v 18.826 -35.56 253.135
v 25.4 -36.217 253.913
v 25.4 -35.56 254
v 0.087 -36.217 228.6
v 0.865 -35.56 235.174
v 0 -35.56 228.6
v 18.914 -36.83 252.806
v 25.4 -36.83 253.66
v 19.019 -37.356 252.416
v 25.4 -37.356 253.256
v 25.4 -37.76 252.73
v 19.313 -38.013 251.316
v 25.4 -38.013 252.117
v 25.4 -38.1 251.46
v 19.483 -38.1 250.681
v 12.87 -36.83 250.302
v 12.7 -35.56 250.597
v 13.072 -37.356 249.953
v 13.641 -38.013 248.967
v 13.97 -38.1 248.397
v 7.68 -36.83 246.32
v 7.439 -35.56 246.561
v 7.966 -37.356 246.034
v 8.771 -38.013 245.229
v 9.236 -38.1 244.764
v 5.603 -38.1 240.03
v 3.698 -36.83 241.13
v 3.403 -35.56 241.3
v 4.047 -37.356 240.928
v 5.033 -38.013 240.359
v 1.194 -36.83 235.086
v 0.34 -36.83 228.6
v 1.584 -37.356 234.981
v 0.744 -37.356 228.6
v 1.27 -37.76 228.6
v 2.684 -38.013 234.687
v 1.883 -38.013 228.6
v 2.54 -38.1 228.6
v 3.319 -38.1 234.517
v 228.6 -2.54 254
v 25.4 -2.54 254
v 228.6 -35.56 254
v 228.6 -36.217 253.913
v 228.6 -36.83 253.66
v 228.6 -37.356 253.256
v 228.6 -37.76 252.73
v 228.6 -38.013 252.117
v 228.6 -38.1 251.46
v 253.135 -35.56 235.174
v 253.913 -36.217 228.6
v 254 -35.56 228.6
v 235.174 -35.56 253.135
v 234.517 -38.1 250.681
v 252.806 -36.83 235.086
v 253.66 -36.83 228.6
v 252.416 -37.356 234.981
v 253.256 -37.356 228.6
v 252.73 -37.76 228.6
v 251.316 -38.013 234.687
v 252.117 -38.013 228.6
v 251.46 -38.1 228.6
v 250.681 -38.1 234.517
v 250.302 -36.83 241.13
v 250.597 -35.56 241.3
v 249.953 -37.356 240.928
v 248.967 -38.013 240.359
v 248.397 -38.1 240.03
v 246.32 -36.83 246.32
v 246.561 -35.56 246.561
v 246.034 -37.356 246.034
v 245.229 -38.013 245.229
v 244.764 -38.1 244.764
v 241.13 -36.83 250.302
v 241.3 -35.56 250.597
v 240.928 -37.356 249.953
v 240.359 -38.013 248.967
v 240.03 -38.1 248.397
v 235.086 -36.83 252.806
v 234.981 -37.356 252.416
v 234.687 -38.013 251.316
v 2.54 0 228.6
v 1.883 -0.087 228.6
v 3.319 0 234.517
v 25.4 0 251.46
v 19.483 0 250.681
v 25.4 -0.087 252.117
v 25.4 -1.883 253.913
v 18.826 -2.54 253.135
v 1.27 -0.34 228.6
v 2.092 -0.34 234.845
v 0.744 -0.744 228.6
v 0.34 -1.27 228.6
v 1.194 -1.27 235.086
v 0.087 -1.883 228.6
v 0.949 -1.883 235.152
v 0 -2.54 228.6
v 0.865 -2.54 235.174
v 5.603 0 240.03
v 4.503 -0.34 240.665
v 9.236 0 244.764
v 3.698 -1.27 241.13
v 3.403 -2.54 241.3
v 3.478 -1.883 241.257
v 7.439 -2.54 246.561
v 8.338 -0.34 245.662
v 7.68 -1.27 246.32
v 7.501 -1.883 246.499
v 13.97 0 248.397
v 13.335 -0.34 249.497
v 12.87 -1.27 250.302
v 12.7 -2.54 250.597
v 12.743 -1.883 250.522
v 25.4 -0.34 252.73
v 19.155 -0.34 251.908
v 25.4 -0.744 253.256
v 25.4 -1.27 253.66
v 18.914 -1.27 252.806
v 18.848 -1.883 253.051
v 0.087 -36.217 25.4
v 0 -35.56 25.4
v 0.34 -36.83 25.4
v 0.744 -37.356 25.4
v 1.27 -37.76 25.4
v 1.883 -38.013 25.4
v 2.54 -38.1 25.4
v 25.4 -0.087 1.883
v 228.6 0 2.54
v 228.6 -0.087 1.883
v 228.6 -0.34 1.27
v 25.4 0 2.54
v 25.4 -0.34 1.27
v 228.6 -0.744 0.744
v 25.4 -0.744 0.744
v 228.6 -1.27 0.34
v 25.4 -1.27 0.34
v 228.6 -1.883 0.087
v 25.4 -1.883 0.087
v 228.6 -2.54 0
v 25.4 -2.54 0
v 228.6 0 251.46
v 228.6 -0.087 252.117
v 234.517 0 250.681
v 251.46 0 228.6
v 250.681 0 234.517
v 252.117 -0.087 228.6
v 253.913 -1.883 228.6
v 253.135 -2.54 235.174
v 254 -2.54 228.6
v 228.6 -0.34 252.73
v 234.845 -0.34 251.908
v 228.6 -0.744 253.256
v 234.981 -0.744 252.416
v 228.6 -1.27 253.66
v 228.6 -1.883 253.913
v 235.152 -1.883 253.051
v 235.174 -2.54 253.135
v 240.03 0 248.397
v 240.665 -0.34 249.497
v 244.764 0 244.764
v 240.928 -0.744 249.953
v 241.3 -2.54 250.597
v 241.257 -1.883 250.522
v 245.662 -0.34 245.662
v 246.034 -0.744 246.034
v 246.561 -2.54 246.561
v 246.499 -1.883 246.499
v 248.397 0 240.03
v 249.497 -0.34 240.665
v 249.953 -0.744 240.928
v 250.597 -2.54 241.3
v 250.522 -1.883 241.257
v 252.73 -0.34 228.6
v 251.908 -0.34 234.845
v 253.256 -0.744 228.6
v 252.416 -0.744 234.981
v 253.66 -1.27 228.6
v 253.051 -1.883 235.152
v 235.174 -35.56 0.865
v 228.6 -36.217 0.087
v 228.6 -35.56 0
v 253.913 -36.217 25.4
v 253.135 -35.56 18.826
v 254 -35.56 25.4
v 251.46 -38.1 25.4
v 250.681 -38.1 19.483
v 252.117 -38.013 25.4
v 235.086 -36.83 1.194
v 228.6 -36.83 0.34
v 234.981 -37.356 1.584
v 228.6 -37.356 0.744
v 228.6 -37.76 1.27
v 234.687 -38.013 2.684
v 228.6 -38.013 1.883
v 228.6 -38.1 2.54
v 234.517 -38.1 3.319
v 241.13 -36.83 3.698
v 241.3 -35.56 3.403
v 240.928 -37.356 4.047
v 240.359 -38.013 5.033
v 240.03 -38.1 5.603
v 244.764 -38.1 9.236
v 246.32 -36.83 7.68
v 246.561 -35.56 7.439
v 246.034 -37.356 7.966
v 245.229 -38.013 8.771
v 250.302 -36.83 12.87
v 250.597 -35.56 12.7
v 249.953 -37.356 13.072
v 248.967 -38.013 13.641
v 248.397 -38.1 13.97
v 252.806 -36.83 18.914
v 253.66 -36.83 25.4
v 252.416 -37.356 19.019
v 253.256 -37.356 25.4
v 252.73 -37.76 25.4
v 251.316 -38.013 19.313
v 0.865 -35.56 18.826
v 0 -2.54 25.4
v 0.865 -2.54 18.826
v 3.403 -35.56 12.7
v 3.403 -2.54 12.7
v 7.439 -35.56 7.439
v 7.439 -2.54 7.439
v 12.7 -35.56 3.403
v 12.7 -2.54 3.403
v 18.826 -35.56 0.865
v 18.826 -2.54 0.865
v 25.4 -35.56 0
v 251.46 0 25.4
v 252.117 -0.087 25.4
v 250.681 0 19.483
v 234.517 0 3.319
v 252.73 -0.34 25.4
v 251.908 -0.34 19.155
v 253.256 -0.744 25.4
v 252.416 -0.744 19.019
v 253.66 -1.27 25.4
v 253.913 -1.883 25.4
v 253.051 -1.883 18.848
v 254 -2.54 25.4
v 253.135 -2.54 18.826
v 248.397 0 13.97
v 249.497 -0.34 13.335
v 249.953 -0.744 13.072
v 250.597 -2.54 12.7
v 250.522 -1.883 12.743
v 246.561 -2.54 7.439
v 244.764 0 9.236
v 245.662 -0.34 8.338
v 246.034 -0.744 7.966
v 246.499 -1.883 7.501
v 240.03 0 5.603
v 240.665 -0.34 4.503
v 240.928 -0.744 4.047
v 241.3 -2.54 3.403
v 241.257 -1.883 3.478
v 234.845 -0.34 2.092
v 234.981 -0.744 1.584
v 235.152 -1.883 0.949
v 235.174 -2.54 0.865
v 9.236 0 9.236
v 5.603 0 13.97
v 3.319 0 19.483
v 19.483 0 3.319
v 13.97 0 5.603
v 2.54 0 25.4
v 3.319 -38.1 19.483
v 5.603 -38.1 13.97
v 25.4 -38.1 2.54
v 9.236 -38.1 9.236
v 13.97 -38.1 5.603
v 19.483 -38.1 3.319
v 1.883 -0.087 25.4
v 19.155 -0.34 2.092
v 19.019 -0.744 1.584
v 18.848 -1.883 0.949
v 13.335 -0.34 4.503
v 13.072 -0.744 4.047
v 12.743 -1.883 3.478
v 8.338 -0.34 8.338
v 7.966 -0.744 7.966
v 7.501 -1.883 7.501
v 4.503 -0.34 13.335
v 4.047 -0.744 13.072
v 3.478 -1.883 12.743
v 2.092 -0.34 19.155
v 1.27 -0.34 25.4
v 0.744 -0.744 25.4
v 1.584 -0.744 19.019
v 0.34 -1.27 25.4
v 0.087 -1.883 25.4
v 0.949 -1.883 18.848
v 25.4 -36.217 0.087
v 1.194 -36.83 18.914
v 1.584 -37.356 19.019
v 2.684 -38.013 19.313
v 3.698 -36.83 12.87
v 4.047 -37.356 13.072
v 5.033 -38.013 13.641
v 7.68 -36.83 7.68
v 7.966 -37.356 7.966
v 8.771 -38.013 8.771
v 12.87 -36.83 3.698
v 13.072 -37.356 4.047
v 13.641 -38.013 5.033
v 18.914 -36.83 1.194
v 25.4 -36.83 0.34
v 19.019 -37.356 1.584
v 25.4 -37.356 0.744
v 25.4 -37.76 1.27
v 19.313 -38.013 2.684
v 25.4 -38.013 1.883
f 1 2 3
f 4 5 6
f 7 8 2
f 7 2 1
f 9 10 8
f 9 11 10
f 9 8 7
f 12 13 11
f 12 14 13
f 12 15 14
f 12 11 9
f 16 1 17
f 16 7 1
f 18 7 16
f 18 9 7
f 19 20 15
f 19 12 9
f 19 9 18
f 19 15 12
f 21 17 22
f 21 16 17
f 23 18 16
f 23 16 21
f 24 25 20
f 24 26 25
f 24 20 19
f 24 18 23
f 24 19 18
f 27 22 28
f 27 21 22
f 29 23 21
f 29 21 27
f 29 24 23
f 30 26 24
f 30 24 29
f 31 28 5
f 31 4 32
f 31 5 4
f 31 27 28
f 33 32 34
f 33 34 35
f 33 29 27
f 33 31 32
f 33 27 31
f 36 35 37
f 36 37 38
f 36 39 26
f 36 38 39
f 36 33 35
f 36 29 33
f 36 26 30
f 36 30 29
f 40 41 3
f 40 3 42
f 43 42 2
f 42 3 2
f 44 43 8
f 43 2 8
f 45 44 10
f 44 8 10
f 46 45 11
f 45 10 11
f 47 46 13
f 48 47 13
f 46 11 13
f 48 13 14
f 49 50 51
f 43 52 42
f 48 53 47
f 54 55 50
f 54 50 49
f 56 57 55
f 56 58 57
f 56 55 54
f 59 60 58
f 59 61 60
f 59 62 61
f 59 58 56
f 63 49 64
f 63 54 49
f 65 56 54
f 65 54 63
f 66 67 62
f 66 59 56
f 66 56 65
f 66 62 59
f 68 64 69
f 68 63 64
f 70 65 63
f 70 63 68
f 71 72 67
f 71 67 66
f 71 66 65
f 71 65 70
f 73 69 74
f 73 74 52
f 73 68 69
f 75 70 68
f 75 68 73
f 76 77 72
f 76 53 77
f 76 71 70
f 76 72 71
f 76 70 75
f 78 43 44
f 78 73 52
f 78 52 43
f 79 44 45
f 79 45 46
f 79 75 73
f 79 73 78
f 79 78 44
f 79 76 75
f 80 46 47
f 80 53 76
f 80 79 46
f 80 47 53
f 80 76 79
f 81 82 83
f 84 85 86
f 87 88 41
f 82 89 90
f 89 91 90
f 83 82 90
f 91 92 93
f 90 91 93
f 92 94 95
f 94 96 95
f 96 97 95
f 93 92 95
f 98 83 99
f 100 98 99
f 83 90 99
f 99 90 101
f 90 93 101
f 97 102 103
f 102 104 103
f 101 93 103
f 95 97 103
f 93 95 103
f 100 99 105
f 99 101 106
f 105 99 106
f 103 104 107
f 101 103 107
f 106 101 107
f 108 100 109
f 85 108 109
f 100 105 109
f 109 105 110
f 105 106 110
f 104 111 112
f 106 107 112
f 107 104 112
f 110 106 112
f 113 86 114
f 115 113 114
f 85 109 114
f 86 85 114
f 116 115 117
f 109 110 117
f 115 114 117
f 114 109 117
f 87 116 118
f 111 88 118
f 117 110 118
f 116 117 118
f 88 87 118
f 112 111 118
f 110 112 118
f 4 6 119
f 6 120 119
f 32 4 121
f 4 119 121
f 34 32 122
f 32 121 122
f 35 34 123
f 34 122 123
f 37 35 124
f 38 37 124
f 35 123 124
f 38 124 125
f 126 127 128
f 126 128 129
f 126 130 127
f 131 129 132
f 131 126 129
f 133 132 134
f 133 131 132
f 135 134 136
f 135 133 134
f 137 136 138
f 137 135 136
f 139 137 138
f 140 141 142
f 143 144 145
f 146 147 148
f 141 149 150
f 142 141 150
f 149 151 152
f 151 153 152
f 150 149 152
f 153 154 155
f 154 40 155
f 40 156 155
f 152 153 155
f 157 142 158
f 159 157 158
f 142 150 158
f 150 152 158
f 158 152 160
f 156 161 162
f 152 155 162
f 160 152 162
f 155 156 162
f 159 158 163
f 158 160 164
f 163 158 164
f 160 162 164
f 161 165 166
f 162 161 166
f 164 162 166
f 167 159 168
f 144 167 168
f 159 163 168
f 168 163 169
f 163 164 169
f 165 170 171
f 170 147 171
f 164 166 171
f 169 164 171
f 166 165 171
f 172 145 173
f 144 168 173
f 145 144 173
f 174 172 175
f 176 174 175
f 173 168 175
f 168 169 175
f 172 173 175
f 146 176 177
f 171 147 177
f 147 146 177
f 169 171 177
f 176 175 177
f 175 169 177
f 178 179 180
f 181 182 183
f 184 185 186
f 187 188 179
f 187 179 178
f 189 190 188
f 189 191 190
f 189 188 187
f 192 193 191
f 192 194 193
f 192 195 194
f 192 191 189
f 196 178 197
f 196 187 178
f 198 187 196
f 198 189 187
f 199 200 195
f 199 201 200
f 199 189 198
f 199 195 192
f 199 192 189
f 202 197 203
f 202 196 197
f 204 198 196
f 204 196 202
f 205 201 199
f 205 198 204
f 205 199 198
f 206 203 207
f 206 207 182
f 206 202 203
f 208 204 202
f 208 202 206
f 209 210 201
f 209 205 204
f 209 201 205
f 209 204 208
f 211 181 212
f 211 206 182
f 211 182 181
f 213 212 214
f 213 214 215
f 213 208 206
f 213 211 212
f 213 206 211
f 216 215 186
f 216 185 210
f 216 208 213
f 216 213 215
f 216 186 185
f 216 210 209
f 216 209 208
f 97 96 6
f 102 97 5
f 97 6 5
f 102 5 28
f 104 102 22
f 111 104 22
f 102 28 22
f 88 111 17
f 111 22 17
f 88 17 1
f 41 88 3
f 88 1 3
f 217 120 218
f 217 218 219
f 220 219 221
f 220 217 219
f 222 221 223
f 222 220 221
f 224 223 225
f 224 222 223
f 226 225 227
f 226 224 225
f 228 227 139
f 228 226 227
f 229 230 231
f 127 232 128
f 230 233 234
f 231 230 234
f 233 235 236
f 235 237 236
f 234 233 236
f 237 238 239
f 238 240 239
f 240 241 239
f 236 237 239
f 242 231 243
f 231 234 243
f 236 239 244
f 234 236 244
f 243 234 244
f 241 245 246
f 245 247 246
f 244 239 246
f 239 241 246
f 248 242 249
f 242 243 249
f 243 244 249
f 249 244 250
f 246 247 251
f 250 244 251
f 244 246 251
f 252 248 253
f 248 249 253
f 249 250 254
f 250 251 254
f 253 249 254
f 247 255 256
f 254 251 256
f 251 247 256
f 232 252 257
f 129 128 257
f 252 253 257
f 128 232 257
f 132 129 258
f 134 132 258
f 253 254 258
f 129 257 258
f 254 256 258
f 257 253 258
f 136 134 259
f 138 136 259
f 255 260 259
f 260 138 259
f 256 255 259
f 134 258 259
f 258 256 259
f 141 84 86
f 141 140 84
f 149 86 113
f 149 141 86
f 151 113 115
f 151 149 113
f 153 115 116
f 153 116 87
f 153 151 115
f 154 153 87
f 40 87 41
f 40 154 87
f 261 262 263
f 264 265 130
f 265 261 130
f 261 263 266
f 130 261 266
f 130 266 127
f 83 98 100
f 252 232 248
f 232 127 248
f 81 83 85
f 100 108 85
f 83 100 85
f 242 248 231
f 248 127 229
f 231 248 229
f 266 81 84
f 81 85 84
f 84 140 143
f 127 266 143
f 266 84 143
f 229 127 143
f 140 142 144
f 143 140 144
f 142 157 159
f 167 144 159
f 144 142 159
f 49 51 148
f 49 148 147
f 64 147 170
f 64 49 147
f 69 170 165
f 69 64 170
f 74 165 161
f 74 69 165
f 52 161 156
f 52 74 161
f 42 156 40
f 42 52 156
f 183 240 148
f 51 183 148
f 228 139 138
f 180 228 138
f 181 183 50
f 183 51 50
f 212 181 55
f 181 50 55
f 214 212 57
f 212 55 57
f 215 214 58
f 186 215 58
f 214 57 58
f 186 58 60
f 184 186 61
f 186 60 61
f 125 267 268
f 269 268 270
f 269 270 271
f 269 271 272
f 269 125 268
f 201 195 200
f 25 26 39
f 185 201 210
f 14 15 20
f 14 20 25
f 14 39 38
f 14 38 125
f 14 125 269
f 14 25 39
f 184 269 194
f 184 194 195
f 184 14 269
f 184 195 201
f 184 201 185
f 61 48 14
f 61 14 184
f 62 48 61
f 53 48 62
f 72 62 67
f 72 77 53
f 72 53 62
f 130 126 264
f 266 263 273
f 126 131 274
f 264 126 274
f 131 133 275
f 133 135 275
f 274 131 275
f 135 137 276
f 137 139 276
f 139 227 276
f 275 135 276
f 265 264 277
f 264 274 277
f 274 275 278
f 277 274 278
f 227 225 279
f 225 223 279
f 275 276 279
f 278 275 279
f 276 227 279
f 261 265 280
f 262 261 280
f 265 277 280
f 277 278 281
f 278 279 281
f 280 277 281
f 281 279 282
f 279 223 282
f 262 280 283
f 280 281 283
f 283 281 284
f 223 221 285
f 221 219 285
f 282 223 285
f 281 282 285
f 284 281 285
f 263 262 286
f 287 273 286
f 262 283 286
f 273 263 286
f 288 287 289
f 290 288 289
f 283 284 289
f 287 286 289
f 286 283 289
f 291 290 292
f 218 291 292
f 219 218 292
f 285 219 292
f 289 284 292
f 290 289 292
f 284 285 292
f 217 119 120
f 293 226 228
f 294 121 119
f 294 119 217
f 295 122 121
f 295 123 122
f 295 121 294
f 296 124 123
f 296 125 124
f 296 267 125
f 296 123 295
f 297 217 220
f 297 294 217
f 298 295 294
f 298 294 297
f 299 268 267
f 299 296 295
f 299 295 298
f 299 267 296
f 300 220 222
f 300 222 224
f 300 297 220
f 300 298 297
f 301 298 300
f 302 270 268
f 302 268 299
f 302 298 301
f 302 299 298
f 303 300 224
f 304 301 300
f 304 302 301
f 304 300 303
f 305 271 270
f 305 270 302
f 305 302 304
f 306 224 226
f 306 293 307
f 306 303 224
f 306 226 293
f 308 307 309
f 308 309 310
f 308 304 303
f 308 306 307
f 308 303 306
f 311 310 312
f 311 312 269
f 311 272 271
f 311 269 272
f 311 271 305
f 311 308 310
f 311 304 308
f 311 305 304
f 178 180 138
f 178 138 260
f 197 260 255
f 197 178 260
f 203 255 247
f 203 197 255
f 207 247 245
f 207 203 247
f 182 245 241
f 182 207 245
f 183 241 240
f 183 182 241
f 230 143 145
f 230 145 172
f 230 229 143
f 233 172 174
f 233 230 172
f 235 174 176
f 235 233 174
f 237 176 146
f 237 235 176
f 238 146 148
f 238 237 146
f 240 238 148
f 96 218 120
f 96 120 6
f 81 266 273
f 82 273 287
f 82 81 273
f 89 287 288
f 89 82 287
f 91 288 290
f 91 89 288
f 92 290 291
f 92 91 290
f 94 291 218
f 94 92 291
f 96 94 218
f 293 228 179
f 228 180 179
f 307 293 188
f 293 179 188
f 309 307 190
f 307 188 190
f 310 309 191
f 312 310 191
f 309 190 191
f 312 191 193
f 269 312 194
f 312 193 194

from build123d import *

# Parameters (mm, degrees)
F0_W     = 254
F0_H     = 254
F1_DEPTH = 38.1
F2_R     = 25.4
F3_R     = 25.4
F4_R     = 25.4
F5_R     = 25.4
F6_R     = 2.54
F7_R     = 2.54


with BuildPart() as f1:
    # F0 (on Front) → F1 (new body)
    with BuildSketch(Plane.XZ):
        with Locations((127, 127)):
            Rectangle(F0_W, F0_H)
    extrude(amount=F1_DEPTH)

    # F2
    f2_edges = [f1.edges().sort_by_distance(p)[0] for p in [
        (0, -19.05, 254),
    ]]
    fillet(f2_edges, radius=F2_R)

    # F3
    f3_edges = [f1.edges().sort_by_distance(p)[0] for p in [
        (0, -19.05, 0),
    ]]
    fillet(f3_edges, radius=F3_R)

    # F4
    f4_edges = [f1.edges().sort_by_distance(p)[0] for p in [
        (254, -19.05, 0),
    ]]
    fillet(f4_edges, radius=F4_R)

    # F5
    f5_edges = [f1.edges().sort_by_distance(p)[0] for p in [
        (254, -19.05, 254),
    ]]
    fillet(f5_edges, radius=F5_R)

    # F6
    f6_edges = [f1.edges().sort_by_distance(p)[0] for p in [
        (127, 0, 254),
        (246.560512, 0, 246.560512),
        (254, 0, 127),
        (246.560512, 0, 7.439488),
        (127, 0, 0),
        (7.439488, 0, 7.439488),
        (0, 0, 127),
        (7.439488, 0, 246.560512),
    ]]
    fillet(f6_edges, radius=F6_R)

    # F7
    f7_edges = [f1.edges().sort_by_distance(p)[0] for p in [
        (246.560512, -38.1, 246.560512),
        (254, -38.1, 127),
        (127, -38.1, 254),
        (7.439488, -38.1, 246.560512),
        (0, -38.1, 127),
        (7.439488, -38.1, 7.439488),
        (127, -38.1, 0),
        (246.560512, -38.1, 7.439488),
    ]]
    fillet(f7_edges, radius=F7_R)


solid = f1.part
